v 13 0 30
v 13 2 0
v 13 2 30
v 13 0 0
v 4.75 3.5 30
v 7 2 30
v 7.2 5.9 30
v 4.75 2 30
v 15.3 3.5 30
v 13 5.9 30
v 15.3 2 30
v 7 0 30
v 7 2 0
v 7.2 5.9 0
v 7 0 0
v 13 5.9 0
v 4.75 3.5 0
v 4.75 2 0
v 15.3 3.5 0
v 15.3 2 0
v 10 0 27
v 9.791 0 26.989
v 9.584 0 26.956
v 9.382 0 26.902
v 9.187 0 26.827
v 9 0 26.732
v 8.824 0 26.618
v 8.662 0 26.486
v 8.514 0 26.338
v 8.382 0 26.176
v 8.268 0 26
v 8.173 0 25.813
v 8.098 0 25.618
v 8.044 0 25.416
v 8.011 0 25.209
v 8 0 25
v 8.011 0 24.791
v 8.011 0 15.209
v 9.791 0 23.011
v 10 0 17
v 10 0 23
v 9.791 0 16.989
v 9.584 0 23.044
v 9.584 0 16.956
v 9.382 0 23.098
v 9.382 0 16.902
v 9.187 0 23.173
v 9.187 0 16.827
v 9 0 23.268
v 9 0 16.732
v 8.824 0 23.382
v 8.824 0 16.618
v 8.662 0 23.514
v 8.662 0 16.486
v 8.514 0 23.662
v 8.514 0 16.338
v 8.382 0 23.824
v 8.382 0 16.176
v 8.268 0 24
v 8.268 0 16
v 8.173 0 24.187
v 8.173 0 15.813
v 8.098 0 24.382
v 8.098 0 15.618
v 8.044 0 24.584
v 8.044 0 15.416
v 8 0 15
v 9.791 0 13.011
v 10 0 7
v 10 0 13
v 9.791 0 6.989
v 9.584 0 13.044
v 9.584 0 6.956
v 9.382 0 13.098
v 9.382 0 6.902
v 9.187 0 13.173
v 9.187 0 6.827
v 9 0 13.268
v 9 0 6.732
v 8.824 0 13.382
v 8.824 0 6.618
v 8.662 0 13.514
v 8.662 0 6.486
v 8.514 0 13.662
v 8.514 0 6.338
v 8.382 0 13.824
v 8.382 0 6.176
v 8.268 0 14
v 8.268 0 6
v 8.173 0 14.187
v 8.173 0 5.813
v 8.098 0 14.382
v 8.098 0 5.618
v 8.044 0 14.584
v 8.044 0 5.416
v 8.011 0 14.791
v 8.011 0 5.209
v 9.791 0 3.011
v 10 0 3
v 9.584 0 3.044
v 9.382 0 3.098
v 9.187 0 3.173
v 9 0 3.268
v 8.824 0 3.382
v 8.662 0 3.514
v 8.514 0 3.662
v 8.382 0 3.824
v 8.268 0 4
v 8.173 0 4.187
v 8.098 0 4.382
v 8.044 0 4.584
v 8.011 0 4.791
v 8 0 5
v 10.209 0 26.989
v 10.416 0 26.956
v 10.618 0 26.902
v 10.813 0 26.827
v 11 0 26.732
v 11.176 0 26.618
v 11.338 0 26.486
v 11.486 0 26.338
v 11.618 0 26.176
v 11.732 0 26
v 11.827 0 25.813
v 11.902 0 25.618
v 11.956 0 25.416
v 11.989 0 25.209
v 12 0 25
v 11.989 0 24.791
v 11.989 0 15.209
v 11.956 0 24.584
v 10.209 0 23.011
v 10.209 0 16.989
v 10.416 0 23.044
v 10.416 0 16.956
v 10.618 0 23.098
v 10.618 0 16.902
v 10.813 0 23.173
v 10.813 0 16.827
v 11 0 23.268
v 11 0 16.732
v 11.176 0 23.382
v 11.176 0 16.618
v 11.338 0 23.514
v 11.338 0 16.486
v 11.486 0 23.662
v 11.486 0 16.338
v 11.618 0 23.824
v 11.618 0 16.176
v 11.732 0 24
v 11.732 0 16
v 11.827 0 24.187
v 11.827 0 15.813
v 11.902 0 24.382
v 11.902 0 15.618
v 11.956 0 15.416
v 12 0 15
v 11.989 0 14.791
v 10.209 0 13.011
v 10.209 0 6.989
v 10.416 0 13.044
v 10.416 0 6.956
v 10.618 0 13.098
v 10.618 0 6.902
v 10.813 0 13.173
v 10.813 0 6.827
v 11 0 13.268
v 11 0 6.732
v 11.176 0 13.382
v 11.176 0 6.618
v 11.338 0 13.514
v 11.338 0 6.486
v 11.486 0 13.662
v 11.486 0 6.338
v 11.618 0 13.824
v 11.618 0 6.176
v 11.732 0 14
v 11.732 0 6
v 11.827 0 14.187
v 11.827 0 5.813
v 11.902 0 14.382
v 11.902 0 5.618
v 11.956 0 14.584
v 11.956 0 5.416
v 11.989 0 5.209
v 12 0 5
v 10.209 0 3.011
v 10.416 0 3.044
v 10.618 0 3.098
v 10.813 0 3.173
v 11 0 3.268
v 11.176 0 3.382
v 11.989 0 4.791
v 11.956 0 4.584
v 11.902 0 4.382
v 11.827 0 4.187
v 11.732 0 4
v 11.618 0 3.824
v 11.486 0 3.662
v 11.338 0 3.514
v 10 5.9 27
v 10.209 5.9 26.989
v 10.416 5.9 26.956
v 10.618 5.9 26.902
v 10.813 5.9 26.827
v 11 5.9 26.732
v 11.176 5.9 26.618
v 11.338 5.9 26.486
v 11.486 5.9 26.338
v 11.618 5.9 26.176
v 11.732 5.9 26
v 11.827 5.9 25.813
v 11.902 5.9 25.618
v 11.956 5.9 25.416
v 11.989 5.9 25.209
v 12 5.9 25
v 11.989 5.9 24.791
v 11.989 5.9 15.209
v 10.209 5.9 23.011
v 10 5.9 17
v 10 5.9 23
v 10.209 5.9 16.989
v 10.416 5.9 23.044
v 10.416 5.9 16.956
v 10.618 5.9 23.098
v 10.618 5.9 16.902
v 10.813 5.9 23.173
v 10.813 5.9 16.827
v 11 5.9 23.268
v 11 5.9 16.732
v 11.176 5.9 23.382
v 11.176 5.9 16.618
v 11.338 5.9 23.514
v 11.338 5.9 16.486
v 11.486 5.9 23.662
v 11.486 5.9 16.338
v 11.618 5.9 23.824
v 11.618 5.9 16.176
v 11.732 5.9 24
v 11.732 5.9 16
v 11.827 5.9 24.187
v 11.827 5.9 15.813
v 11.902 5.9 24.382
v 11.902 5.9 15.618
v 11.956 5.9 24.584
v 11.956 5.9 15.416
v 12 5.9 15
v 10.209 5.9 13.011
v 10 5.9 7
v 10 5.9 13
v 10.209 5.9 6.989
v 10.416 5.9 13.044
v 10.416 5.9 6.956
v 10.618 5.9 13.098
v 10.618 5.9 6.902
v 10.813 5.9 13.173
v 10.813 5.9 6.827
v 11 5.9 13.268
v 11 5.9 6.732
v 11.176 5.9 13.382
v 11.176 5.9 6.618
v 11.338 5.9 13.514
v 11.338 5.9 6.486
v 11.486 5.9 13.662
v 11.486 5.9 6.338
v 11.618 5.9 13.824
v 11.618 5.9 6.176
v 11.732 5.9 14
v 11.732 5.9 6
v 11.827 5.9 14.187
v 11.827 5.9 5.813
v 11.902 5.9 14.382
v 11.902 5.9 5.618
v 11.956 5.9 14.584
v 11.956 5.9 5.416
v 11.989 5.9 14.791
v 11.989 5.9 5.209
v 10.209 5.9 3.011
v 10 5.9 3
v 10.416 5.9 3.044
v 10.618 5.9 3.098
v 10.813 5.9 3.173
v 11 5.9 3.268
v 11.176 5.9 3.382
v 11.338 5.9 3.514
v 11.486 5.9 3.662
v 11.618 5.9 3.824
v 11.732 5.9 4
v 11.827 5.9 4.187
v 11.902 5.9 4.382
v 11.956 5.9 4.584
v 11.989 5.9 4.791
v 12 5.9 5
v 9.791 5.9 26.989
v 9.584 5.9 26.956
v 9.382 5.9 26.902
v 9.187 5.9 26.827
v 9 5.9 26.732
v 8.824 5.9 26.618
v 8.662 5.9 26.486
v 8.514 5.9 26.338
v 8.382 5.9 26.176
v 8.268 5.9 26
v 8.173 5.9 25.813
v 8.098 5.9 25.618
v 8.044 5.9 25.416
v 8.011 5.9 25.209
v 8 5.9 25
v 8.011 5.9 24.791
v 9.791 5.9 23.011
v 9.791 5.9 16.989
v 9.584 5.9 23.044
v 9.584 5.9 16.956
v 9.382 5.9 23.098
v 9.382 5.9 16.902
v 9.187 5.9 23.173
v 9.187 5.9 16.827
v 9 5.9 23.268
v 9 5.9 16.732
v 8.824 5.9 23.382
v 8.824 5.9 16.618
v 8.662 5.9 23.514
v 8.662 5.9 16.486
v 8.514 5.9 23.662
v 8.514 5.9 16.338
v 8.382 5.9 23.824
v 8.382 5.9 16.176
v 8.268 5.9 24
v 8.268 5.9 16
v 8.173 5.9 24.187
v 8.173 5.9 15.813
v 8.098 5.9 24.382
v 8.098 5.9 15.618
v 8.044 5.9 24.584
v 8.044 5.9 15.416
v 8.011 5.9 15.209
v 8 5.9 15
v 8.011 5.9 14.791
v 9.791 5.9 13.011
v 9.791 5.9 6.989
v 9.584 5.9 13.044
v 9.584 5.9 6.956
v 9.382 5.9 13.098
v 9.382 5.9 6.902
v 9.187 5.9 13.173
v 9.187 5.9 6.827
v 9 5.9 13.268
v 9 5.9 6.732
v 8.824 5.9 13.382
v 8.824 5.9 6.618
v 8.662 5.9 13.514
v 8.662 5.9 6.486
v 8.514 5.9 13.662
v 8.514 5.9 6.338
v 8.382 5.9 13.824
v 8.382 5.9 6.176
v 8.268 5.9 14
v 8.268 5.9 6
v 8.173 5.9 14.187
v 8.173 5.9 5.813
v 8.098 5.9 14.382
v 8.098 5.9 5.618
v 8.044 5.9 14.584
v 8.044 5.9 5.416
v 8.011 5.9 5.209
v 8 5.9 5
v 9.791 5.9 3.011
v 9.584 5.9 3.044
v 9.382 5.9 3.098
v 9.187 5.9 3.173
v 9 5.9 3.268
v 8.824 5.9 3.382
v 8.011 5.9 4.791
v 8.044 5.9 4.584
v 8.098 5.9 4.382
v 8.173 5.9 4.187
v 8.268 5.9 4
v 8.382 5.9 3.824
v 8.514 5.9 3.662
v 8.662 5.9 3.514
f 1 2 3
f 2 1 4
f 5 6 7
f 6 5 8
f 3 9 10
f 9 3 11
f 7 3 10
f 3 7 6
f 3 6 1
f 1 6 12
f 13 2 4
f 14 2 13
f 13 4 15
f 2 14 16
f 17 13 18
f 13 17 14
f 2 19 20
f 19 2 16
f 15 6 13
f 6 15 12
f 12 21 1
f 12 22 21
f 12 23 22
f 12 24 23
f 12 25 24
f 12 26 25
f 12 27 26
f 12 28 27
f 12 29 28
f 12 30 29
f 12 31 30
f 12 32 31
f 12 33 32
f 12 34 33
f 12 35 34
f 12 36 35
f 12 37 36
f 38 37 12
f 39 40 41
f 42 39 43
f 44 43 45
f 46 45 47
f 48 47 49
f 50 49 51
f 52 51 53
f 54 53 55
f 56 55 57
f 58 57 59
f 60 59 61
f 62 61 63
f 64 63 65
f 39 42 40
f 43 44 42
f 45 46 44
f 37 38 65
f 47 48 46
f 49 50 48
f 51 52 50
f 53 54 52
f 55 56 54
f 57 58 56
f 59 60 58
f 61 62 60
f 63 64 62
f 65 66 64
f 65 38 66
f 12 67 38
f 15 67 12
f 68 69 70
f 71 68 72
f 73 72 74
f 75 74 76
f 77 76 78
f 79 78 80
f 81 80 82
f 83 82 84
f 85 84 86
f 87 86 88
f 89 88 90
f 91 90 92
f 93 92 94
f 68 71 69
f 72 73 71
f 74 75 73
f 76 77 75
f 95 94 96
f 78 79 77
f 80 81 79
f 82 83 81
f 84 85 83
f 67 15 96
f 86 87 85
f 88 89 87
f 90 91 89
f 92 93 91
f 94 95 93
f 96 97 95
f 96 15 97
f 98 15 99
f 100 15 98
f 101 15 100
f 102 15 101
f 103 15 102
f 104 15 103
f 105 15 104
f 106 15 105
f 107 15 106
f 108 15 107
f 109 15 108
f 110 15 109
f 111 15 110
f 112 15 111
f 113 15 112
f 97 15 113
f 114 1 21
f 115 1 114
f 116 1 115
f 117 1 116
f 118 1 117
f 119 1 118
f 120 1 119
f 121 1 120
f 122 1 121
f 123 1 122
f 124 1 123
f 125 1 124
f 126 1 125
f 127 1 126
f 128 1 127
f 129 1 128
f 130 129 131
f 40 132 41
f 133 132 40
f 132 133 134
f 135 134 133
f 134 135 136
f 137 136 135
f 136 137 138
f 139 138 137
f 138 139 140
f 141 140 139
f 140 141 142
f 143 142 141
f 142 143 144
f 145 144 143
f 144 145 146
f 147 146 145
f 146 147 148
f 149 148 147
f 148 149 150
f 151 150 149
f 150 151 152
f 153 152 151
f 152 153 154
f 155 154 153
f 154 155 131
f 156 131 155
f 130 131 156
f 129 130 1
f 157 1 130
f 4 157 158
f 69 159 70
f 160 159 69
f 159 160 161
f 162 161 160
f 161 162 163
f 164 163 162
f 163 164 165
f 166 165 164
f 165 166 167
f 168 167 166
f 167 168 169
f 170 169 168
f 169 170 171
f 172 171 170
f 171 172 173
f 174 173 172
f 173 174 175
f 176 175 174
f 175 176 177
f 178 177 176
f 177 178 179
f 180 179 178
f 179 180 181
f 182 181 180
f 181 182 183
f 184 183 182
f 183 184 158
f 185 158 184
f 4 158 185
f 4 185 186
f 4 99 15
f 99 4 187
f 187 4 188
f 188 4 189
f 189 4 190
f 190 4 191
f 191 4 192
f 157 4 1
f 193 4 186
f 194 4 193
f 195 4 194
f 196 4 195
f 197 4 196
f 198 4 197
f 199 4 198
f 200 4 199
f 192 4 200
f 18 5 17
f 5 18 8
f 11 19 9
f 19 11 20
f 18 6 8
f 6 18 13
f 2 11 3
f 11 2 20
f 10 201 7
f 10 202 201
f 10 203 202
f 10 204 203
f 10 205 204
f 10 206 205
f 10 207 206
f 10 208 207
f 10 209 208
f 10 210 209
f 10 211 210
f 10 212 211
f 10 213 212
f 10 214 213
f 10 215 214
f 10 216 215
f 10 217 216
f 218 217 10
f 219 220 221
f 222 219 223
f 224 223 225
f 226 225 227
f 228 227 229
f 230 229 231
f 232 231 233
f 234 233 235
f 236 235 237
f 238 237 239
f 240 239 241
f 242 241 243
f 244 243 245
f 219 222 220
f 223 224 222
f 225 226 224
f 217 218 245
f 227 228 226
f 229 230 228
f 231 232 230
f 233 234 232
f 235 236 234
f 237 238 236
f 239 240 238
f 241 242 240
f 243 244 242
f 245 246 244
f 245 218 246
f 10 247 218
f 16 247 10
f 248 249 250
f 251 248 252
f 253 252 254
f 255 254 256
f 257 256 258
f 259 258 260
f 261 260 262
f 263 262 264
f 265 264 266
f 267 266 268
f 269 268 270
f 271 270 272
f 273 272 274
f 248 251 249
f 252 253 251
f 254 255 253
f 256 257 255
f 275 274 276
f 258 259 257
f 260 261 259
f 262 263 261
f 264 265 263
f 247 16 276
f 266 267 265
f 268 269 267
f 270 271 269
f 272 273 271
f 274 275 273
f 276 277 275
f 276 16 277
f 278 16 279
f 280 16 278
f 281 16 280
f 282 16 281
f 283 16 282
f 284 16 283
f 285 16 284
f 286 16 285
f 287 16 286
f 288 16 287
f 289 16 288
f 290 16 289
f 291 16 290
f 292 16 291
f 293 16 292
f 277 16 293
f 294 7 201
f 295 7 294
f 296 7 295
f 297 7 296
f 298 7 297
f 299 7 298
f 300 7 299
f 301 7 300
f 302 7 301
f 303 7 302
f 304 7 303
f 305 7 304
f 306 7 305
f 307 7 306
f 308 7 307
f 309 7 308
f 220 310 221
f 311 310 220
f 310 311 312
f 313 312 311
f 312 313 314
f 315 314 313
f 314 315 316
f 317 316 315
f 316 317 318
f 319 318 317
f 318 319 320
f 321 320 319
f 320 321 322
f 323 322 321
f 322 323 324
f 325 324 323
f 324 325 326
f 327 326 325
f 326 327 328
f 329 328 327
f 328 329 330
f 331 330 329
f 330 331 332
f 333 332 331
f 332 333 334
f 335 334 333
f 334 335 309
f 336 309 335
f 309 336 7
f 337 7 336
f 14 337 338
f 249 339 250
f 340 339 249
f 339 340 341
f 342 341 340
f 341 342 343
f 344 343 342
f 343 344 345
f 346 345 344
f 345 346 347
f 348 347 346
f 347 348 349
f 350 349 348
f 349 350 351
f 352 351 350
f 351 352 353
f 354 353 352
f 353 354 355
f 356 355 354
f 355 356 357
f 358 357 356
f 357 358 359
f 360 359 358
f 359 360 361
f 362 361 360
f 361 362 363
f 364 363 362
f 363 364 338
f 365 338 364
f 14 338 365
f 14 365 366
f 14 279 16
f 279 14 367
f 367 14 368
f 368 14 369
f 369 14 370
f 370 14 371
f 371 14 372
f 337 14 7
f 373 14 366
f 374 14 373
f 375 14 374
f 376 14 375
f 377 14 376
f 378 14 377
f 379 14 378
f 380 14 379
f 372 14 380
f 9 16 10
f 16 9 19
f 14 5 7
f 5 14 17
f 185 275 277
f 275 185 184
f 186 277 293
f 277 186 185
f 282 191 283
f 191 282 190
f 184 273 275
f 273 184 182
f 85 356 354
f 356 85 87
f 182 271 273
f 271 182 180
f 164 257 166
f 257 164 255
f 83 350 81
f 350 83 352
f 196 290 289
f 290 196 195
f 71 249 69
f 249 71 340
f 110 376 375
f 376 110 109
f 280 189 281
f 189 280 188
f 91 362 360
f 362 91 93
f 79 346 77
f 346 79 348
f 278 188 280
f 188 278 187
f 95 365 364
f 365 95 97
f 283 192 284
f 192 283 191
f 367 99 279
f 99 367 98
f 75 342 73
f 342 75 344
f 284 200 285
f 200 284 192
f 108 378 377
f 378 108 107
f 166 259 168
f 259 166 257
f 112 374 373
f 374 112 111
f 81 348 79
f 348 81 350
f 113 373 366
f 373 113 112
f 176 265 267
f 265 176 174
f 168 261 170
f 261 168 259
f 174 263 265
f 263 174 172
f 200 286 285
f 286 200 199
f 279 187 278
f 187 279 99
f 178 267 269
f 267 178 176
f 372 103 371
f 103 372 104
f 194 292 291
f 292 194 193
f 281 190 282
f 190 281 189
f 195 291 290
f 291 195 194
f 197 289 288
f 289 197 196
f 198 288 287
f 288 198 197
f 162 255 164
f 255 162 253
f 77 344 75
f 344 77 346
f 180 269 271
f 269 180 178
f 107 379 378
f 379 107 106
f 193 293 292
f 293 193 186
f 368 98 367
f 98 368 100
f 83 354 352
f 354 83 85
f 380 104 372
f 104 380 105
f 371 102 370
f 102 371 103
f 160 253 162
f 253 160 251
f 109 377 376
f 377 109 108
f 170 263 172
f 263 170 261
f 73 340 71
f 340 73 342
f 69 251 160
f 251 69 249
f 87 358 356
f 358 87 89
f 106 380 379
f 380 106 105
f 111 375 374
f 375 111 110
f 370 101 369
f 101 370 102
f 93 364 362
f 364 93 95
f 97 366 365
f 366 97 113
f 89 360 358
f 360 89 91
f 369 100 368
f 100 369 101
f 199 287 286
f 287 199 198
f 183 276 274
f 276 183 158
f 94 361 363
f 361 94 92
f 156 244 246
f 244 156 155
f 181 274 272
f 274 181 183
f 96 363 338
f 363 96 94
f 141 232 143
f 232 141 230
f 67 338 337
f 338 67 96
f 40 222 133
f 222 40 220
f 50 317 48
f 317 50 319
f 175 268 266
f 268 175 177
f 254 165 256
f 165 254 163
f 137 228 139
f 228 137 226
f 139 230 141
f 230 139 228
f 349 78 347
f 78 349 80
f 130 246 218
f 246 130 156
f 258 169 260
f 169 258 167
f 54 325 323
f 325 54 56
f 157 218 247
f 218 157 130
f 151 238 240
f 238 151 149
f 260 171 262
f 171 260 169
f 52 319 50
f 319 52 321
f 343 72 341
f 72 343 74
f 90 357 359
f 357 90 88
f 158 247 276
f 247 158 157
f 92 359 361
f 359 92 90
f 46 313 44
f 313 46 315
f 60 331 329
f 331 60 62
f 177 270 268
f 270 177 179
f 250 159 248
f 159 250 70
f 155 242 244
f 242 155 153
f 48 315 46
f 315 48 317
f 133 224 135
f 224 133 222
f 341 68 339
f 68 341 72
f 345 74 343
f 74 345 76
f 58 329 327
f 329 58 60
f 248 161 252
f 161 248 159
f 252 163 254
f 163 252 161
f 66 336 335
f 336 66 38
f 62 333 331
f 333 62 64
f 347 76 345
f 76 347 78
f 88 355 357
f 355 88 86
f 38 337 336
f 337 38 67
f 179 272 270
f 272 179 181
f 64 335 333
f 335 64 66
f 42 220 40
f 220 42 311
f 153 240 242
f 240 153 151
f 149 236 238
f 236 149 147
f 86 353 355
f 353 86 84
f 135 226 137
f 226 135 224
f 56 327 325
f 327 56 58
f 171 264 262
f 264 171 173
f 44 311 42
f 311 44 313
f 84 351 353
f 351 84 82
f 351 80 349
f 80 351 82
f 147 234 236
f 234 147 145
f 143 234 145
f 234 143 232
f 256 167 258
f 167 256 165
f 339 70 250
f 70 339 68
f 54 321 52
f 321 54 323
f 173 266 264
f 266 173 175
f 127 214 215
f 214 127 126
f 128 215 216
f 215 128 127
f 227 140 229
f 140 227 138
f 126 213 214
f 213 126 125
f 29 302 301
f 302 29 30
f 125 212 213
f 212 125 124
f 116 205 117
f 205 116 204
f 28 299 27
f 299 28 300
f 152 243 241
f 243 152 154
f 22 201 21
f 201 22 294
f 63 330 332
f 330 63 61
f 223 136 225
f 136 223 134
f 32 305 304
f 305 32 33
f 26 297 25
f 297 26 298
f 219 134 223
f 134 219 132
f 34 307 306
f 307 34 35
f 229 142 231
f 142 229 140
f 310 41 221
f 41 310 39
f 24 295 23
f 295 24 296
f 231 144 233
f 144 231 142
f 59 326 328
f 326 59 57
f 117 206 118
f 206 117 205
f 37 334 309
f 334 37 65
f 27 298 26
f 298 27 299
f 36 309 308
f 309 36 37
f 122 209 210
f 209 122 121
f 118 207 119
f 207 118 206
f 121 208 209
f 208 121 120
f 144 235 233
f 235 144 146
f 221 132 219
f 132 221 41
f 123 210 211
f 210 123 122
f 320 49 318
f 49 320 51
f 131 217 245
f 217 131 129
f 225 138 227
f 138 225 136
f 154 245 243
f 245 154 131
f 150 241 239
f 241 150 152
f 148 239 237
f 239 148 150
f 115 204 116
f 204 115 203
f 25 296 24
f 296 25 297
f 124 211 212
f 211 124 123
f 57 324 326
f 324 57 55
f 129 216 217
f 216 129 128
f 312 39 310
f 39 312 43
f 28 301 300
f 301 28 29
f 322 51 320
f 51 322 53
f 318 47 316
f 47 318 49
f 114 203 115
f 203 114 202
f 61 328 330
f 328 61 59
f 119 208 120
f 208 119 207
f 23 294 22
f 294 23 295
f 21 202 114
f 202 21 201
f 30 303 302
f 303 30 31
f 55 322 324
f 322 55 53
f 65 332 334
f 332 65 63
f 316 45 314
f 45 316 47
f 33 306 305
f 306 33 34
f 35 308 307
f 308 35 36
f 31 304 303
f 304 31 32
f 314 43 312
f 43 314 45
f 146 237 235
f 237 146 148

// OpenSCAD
echo(version=version());
include <threads.scad>


// Base Config
base_W = 120; // Min Size < 10
base_H = 40; // Min Size < 40
base_T = 0.5; // Fix Size = 0.5 for Stapler
default_S = 12; // Fix Size = 12 for Stapler (Stapler size)
default_T = 3.0; // Fix Size = 2.0 for Stapler (base_T < default_T)
$fn = 60;
minkowski_R = 2;
outR=14;
pitchN=4;
interR=9;
bladehuckR=0;

* difference(){
    import("2020 alu section.STL", convexity=3);
    translate([-5, -5, 10]) cube([30, 30, 500]);
}

difference(){
    union() {
        translate([7, 0, 0]) cube([6, 3, 30]);
        hull() {
            translate([4.75, 2, 0]) cube([10.55, 1.5, 30]);
            translate([7.2, 5.8, 0]) cube([5.8, 0.1, 30]);
        }
    }
    translate([10, 8, 5]) rotate([90, 0, 0]) cylinder(h=10, r=2, center=false);
    translate([10, 8, 15]) rotate([90, 0, 0]) cylinder(h=10, r=2, center=false);
    translate([10, 8, 25]) rotate([90, 0, 0]) cylinder(h=10, r=2, center=false);
    *translate([87.5, 60, -19]) rotate([0, 0, 180]) import("M3x15x0.5 Philips Pan Head Screw.stl", convexity=3);
    *translate([87.5, 60, -9]) rotate([0, 0, 180]) import("M3x15x0.5 Philips Pan Head Screw.stl", convexity=3);
    *translate([87.5, 60, 1]) rotate([0, 0, 180]) import("M3x15x0.5 Philips Pan Head Screw.stl", convexity=3);
}

translate([2, 2, 2]) {
    // main body
    *union() {
        difference(){
            union() {
                intersection() {
                    union() {
                            translate([0, 30.25, -7.75]) cube([18.75, 4.75, 17.75]);
                            translate([0, 8, -7.75]) cube([8.5, 23, 7.5]);
                            translate([10.25, 8, 2.5]) cube([8.5, 23, 7.5]);
                    }
                    translate([9.5, 36, 1.25]) rotate([90, 0, 0]) cylinder(h=30, r=interR, center=false);
                }
                // body screw
                translate([9.5, 35, 1.25]) rotate([90, 0, 0]) metric_thread (diameter=23, pitch=pitchN, length=13);
            }
            translate([-9.7, 8, -0.3]) cube([20, 22, 20]);
            translate([8.5, 8, -17.5]) cube([20, 22, 20]);
        }
        // body
        difference(){
                translate([9.5, 65, 1.25]) rotate([90, 0, 0]) cylinder(h=33, r=outR, center=false);
                translate([9.5, 65, 1.25]) rotate([90, 0, 0]) metric_thread (diameter=24, pitch=pitchN, length=10, internal=true);
                translate([9.5, 65, 1.25]) rotate([90, 0, 0]) cylinder(h=29, r=10.5, center=false);
        }
        // body plate
        translate([-2.5, 33, 0]) cube([24, 21.8, 2]);
        // suport parts
        * translate([-0.5, 54.8, 1]) {
            hull() {
                translate([0, 5.2, 1]) cube([20, 5, 0.1]);
                translate([0, 0, 0]) cube([20, 10.2, 0.1]);
                translate([0, 5.2, -1]) cube([20, 5, 0.1]);
            }
        }
    }
    // blade holder
    *difference(){
        union() {
            intersection() {
                union() {
                    union() {
                        translate([0, 8, 0]) difference(){
                            cube([10, 22, 10]);
                            translate([8.8, 0, 0]) cube([5, 11.5, 11]);
                            translate([0, 0, 0]) cube([11, 11.5, 1.2]);
                        }
                        translate([5, 11, 5.5]) rotate([0, 90, 0]) cylinder(h=5, r=1.4, center=false, $fn=20);
                        translate([4.5, 11, 0]) rotate([0, 0, 0]) cylinder(h=5, r=1.4, center=false, $fn=20);
                    }
                    translate([8.7, 0, -7.7]) rotate([0, 90, 0]) mirror([1,0,0]) union() {
                        translate([0, 8, 0]) difference(){
                            cube([10, 22, 10]);
                            translate([8.8, 0, 0]) cube([5, 11.5, 11]);
                            translate([0, 0, 0]) cube([11, 11.5, 1.2]);
                        }
                        translate([5, 11, 5.5]) rotate([0, 90, 0]) cylinder(h=5, r=1.4, center=false, $fn=20);
                        translate([4.5, 11, 0]) rotate([0, 0, 0]) cylinder(h=5, r=1.4, center=false, $fn=20);
                    }
                }
                translate([9.5, 36, 1.25]) rotate([90, 0, 0]) cylinder(h=30, r=interR, center=false);
            }
            // body screw
            translate([9.5, 35, 1.25]) rotate([90, 0, 0]) metric_thread (diameter=23, pitch=pitchN, length=13);
        }
        translate([10, 8, 2.3]) cube([20, 22, 20]);
        translate([-11.2, 8, -20]) cube([20, 22, 20]);
        translate([-5, 30, -15]) cube([30, 10, 30]);
    }

    // cap
    *union() {
        translate([9.5, 85, 1.25]) rotate([90, 0, 0]) cylinder(h=8, r=outR, center=false);
        translate([9.5, 80, 1.25]) rotate([90, 0, 0]) metric_thread (diameter=23, pitch=pitchN, length=9.5);
    }

    // main cap
    *difference(){
        translate([9.5, 0, 1.25]) rotate([90, 0, 0]) cylinder(h=43, r=outR, center=false);
        translate([9.5, 5, 1.25]) rotate([90, 0, 0]) metric_thread (diameter=24, pitch=pitchN, length=45, internal=true);
    }

    // stopper ring
    *difference(){
        translate([9.5, 0, 1.25]) rotate([90, 0, 0]) cylinder(h=43, r=outR, center=false);
        translate([9.5, 5, 1.25]) rotate([90, 0, 0]) metric_thread (diameter=24.3, pitch=pitchN, length=45, internal=true);
        translate([-10, -45, -20]) cube([40, 40, 40]);
    }



}
